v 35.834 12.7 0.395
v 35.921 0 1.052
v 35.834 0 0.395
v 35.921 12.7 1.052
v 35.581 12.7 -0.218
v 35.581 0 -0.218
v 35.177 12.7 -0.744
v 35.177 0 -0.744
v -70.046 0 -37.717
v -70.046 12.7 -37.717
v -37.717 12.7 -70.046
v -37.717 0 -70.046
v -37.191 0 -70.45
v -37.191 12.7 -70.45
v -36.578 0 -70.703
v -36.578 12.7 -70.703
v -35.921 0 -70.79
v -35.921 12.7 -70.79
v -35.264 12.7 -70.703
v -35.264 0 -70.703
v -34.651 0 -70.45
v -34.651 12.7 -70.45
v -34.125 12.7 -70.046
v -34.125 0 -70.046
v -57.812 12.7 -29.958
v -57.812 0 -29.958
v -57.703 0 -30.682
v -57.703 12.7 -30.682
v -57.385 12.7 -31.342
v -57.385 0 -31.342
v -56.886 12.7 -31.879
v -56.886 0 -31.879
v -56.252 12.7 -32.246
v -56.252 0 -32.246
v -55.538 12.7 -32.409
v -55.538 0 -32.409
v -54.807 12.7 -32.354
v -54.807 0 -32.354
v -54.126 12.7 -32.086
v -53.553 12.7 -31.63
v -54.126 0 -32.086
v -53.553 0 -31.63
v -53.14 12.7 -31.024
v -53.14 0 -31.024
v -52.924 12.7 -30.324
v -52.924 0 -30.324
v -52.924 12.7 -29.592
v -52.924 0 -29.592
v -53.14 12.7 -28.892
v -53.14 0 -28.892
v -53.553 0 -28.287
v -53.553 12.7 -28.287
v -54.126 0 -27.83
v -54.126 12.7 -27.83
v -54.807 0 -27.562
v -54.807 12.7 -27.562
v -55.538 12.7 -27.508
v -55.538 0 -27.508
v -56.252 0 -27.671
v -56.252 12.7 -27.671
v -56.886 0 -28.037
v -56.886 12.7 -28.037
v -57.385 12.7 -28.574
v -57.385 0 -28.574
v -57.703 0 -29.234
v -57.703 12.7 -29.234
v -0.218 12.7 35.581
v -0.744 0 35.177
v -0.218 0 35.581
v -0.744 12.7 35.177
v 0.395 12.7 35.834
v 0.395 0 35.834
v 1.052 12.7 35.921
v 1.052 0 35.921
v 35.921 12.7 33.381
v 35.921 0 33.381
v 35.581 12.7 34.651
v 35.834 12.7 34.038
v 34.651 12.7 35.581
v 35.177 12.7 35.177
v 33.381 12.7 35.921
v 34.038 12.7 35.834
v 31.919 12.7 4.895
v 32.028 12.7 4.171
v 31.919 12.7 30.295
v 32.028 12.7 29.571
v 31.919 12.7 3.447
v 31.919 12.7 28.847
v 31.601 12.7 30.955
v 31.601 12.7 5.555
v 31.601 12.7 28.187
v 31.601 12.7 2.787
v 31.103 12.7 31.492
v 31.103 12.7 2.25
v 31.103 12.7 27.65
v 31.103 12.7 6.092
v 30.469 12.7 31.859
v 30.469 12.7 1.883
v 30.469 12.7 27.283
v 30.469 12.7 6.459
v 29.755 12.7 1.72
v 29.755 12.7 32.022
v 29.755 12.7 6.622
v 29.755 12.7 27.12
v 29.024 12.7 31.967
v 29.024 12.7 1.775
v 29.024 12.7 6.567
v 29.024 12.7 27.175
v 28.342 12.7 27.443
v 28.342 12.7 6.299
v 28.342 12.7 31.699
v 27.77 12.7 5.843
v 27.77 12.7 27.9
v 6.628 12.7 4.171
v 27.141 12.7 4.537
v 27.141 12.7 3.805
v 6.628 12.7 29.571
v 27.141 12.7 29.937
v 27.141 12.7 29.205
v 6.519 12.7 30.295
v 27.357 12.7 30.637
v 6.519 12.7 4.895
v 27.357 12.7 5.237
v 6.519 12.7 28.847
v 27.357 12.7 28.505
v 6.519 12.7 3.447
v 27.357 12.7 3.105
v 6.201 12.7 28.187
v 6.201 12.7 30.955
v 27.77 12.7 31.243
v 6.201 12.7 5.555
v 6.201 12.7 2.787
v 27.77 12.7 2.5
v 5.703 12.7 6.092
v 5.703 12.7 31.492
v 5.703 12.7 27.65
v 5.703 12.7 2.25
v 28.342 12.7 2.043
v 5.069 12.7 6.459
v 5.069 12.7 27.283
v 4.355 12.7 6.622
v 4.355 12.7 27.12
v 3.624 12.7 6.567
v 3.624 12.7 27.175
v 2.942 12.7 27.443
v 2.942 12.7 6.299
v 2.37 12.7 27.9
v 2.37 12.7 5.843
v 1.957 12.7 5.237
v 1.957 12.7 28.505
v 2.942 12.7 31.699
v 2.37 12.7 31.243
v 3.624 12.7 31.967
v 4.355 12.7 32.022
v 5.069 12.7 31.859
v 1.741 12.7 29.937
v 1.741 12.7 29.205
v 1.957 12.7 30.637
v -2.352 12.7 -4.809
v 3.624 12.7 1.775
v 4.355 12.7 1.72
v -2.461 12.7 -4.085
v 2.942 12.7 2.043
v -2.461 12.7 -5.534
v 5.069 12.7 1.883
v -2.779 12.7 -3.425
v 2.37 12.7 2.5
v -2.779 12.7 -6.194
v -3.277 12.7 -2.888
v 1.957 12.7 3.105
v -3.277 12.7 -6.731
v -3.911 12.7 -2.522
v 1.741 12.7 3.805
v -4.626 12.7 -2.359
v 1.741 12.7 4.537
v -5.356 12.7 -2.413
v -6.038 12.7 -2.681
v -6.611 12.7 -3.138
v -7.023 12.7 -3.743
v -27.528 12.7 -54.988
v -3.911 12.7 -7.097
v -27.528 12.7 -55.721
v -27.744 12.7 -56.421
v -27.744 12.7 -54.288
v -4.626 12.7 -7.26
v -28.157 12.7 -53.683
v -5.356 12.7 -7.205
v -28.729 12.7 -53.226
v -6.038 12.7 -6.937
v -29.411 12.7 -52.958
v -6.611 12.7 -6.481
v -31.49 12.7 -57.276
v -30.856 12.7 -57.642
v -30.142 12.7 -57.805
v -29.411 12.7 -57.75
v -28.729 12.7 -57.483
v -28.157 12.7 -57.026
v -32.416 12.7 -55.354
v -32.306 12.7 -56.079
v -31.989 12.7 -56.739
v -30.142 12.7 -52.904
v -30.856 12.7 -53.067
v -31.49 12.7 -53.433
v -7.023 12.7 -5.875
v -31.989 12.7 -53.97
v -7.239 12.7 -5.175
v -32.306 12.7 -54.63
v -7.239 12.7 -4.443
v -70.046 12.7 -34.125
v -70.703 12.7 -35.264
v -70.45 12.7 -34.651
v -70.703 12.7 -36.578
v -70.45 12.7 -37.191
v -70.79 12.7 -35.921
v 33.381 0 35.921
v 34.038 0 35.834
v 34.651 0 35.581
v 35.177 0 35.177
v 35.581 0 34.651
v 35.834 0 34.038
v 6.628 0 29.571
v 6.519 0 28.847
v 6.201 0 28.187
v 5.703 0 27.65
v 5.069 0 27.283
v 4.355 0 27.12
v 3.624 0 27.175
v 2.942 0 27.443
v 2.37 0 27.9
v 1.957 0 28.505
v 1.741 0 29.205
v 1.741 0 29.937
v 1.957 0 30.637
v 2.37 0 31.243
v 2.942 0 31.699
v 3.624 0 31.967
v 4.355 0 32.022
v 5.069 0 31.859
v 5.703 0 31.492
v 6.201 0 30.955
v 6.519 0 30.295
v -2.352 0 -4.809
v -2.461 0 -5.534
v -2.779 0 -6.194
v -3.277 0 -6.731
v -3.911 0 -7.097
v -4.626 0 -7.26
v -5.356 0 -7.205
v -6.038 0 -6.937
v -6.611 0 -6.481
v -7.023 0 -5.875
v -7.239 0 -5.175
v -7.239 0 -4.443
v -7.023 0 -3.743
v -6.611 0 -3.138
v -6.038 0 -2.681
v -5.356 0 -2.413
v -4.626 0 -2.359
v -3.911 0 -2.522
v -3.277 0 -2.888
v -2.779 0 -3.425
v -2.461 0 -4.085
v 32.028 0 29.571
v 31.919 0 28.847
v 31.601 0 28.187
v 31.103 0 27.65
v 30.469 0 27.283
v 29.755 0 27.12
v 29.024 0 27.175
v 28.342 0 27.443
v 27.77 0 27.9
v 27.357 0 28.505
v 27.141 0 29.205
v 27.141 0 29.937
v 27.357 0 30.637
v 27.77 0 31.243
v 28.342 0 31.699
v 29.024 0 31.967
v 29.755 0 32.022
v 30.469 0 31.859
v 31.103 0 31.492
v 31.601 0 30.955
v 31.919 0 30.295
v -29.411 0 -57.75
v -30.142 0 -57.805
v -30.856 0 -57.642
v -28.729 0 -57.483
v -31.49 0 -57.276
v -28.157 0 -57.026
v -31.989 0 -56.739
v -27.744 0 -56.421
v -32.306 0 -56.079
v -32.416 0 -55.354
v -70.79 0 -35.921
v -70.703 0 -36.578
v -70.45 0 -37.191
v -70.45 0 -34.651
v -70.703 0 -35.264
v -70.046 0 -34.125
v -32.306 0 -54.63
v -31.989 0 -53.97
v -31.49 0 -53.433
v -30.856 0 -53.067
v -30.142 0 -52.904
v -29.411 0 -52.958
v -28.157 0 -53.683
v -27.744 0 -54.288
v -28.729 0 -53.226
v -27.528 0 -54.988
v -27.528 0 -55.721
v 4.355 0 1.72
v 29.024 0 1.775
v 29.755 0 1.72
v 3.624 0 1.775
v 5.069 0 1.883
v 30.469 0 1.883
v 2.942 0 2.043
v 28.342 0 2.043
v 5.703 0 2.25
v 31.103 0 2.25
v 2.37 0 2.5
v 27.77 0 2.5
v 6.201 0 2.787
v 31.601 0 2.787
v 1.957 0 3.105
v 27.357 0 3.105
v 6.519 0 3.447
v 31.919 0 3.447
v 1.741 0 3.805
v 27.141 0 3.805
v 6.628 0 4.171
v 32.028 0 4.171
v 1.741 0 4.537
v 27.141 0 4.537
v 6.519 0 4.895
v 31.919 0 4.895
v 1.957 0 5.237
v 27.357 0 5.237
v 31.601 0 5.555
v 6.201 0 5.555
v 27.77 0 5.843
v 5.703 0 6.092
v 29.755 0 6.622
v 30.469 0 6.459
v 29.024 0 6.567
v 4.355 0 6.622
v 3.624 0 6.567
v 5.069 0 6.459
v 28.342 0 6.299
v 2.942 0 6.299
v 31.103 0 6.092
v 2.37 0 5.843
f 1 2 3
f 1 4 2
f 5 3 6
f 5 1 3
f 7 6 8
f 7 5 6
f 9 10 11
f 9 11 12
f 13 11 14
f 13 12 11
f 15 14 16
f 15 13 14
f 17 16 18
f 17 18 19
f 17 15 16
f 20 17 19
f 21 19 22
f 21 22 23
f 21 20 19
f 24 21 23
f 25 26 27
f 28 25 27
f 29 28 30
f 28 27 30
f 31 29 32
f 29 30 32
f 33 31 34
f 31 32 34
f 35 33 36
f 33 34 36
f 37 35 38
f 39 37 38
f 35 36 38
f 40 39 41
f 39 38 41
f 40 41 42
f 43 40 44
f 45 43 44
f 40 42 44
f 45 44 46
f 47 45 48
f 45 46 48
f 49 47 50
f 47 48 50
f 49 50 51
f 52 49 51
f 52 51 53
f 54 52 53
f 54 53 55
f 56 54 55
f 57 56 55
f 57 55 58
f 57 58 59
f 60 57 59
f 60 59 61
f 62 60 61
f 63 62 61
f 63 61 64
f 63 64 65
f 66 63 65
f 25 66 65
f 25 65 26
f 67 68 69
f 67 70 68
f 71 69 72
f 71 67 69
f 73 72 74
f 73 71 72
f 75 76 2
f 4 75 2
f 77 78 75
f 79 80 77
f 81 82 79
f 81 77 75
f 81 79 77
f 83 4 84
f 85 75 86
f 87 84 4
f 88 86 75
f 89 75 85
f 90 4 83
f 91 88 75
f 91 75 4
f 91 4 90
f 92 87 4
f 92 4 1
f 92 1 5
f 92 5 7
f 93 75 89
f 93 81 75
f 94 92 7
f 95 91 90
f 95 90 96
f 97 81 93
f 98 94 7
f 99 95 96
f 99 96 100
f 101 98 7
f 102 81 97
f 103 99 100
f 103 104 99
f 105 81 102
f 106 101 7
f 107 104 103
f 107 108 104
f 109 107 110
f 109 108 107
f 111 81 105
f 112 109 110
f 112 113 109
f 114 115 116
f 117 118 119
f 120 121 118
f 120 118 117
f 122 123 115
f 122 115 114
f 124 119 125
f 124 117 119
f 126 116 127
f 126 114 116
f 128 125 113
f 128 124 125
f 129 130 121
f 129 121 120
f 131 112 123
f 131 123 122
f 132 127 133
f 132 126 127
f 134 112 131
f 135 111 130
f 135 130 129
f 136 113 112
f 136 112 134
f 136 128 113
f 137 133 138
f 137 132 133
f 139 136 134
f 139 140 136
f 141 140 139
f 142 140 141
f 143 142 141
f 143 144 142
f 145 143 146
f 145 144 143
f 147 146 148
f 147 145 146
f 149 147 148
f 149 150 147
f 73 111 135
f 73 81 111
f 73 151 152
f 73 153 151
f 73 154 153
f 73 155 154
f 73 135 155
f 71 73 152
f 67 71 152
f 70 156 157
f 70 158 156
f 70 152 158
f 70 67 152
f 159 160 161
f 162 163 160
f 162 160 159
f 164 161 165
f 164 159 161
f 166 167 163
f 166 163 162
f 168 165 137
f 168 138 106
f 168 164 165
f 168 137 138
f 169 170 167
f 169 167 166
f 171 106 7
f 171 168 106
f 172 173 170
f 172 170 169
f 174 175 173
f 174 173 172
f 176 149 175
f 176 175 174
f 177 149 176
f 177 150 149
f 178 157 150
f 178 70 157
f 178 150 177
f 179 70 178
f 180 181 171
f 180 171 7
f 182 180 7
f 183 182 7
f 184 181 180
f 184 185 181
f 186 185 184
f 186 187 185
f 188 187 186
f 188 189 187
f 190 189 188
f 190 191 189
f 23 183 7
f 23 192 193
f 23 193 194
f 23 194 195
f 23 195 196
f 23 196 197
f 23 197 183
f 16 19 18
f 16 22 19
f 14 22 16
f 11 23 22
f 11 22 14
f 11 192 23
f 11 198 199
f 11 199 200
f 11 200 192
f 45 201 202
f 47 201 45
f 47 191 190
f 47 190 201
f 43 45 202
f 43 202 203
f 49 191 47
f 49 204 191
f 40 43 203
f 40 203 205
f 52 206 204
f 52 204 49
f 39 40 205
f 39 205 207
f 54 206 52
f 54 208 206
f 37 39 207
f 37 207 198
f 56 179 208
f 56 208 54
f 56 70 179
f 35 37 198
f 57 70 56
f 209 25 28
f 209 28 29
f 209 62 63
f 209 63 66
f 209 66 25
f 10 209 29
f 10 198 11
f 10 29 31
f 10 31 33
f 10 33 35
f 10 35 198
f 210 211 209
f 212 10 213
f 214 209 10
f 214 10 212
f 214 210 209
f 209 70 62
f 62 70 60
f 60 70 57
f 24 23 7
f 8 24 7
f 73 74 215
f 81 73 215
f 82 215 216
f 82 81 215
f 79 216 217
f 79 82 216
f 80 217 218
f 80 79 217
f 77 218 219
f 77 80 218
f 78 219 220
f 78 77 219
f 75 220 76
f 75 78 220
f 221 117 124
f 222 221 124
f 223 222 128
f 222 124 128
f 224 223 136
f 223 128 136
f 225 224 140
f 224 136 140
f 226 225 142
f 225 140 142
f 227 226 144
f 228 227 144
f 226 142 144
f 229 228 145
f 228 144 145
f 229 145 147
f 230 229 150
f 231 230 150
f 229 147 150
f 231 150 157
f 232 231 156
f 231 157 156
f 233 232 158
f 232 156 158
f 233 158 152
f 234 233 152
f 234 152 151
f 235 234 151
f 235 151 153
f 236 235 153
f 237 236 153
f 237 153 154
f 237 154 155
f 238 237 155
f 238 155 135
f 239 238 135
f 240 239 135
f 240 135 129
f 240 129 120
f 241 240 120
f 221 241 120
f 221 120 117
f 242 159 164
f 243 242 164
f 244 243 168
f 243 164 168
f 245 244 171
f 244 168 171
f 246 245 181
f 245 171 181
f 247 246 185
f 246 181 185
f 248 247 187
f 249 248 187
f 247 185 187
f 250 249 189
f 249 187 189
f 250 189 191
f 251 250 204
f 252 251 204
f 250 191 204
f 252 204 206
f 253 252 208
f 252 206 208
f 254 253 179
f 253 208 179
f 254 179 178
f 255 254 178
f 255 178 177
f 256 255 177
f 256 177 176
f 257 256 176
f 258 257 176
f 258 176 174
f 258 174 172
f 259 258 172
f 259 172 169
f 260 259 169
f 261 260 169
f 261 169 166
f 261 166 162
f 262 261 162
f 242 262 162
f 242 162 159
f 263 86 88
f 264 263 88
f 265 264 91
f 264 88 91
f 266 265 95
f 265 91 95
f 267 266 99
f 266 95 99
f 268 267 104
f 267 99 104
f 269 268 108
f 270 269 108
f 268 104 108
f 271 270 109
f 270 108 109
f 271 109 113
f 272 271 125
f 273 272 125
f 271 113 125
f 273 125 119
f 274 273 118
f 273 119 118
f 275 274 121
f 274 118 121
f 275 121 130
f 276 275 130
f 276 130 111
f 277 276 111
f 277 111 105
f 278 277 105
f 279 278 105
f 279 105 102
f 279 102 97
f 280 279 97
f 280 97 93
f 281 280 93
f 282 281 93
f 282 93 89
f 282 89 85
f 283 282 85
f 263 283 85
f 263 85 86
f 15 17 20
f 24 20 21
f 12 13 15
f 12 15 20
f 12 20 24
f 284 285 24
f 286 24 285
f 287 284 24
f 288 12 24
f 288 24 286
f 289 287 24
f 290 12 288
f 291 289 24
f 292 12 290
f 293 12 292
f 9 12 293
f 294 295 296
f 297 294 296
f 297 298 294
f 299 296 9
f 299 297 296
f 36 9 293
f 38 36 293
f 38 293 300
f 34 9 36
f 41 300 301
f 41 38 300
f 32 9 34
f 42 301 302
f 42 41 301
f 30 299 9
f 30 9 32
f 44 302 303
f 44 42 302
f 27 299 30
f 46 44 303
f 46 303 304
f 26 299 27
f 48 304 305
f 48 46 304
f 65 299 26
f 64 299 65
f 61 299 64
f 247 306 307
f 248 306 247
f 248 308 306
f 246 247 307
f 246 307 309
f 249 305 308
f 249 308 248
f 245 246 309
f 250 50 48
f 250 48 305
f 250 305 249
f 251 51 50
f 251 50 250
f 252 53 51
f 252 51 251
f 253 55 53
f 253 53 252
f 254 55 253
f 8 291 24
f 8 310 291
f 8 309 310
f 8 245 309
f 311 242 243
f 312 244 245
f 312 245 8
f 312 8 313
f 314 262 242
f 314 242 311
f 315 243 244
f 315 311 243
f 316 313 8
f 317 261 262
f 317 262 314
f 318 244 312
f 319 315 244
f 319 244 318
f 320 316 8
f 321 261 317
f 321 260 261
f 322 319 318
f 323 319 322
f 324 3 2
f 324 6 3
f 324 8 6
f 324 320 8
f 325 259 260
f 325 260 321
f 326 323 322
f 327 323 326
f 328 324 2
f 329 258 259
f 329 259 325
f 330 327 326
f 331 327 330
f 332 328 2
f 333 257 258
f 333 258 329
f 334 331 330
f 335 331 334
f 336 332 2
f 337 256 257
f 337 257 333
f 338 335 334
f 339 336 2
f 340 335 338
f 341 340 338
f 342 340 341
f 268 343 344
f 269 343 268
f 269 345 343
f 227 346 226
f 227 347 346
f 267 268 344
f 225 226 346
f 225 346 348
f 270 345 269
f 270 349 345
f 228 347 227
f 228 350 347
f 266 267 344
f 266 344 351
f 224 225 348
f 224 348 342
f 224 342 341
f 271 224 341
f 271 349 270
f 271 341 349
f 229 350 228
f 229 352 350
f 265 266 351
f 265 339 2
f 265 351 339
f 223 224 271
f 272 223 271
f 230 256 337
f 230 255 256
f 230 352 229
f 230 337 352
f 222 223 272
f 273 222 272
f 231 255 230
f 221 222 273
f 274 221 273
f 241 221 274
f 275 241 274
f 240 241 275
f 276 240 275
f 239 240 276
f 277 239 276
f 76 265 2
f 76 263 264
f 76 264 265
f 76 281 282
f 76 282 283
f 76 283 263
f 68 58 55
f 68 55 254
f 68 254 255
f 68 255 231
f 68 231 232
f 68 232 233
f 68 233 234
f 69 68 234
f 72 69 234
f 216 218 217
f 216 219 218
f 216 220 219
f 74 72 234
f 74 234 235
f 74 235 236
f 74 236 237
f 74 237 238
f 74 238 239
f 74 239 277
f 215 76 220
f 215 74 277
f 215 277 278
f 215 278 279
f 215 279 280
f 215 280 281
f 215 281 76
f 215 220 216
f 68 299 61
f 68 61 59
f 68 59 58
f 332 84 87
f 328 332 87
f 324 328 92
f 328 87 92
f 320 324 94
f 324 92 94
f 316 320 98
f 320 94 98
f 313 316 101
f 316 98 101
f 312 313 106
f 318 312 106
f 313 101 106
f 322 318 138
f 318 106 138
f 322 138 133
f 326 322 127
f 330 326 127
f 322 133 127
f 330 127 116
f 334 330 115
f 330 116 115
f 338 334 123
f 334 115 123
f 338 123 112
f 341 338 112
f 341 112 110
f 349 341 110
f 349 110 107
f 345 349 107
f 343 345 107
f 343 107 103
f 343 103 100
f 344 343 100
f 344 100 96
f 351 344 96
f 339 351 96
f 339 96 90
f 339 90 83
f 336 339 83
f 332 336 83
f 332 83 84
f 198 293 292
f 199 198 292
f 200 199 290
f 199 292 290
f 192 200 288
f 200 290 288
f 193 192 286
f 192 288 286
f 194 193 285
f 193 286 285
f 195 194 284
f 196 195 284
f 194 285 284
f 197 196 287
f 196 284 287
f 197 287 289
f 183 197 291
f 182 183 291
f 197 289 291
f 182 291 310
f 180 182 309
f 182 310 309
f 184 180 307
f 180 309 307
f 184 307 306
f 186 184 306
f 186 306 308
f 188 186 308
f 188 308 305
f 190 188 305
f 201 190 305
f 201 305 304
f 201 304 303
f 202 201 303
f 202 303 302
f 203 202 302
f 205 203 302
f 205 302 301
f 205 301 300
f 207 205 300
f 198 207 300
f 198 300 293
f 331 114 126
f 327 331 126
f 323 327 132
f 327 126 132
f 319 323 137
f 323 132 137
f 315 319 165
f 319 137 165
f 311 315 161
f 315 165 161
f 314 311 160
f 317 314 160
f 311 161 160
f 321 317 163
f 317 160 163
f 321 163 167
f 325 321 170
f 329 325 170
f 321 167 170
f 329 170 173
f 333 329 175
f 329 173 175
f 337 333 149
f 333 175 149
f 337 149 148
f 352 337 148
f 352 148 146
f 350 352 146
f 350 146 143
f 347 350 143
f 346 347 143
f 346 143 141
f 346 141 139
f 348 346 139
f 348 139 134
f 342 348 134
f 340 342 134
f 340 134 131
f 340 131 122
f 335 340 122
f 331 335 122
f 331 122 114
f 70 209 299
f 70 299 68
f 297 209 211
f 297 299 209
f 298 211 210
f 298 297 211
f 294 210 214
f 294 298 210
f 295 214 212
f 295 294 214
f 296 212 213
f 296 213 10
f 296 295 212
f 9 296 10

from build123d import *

# Parameters (mm, degrees)
SKETCH3_W             = 35.921024484
SKETCH3_H             = 35.921024484
BOSS_EXTRUDE2_DEPTH   = 12.7
BOSS_EXTRUDE3_DEPTH   = 25.4
F_8_CLEARANCE_HOLE1_D = 4.9149
F_8_CLEARANCE_HOLE2_D = 4.9149
FILLET1_R             = 2.54


with BuildPart() as part:
    # Sketch3 → Boss-Extrude2 (new body)
    with BuildSketch(Plane(origin=(0, 0, 0), x_dir=(1, 0, 0), z_dir=(0, 1, 0))):
        with Locations((17.960512242, -17.960512242)):
            Rectangle(SKETCH3_W, SKETCH3_H)
    extrude(amount=BOSS_EXTRUDE2_DEPTH)

    # Sketch4 → Boss-Extrude3 (add, symmetric)
    with BuildSketch(Plane(origin=(0, 0, 0), x_dir=(0.7071067811865476, 0, 0.7071067811865475), z_dir=(-0.7071067811865475, 0, 0.7071067811865476))):
        Polygon((25.4, 12.7), (-50.8, 12.7), (-76.2, 12.7), (-76.2, 0), (0, 0), (25.4, 0), align=None)
    extrude(amount=BOSS_EXTRUDE3_DEPTH, both=True)

    # #8 Clearance Hole1 (through all)
    with Locations(Plane(origin=(0, 0, 0), x_dir=(-1, 0, 0), z_dir=(0, -1, 0))):
        with Locations((-29.571024484, -29.571024484), (-4.171024484, -4.171024484), (-29.571024484, -4.171024484), (-4.171024484, -29.571024484), (4.809231637, 4.809231637)):
            Hole(F_8_CLEARANCE_HOLE1_D / 2)

    # #8 Clearance Hole2 (through all)
    with Locations(Plane(origin=(0, 12.7, 0), x_dir=(1, 0, 0), z_dir=(0, 1, 0))):
        with Locations((-55.35429873, 29.95813442), (-29.95813442, 55.35429873)):
            Hole(F_8_CLEARANCE_HOLE2_D / 2)

    # Fillet1
    fillet1_edges = [part.edges().sort_by_distance(p)[0] for p in [
        (-35.921024484, 6.35, -71.842048969),
        (-71.842048969, 6.35, -35.921024484),
        (35.921024484, 6.35, 0),
        (35.921024484, 6.35, 35.921024484),
        (0, 6.35, 35.921024484),
    ]]
    fillet(fillet1_edges, radius=FILLET1_R)


solid = part.part
